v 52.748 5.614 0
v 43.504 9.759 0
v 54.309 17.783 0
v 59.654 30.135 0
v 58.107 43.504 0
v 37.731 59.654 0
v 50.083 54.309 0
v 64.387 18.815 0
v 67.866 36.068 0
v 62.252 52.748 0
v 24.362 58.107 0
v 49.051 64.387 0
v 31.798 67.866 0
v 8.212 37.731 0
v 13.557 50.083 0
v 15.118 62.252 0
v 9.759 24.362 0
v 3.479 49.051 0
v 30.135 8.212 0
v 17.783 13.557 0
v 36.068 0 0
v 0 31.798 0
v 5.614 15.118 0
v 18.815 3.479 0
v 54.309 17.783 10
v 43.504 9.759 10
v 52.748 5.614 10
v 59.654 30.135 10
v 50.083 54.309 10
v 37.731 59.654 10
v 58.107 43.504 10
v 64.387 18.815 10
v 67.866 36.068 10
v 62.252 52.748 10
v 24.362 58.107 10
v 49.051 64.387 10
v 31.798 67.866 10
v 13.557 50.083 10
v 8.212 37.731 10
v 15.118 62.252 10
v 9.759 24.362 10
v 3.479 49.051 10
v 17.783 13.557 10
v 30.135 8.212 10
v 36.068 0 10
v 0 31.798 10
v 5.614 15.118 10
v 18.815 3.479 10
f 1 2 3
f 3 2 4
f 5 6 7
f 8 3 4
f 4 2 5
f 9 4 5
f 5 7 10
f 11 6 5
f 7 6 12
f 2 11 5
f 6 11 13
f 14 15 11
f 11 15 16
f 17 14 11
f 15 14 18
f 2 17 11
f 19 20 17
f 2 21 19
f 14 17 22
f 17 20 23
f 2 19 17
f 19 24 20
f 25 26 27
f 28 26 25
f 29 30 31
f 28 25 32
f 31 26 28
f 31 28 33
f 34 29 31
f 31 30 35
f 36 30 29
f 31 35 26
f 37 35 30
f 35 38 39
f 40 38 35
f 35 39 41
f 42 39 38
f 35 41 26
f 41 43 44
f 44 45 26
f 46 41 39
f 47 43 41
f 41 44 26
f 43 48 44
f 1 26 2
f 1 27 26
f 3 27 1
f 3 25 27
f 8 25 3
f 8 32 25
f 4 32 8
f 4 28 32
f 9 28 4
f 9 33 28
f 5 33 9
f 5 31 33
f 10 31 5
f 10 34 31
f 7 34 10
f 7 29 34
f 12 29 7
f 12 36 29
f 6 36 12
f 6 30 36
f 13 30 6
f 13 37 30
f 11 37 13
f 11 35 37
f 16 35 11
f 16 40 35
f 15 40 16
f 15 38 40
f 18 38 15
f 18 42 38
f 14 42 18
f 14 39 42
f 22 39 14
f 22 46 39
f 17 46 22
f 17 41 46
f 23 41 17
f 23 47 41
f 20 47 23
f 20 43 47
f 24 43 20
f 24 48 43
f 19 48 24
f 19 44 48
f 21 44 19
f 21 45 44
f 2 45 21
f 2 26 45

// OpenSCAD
$fn = 32;

// ----------------------------------------------------------------------
// Chain sprocket: 12 teeth, 26 mm root radius
// ----------------------------------------------------------------------

// --- parameters (mm) ---
profile_height = 10;      // extrusion height
profile_points = 24;      // points of the closed outline

profile = [[59.654, 30.135], [67.866, 36.068], [58.107, 43.504], [62.252, 52.748], [50.083, 54.309], [49.051, 64.387], [37.731, 59.654], [31.798, 67.866], [24.362, 58.107], [15.118, 62.252], [13.557, 50.083], [3.479, 49.051], [8.212, 37.731], [0, 31.798], [9.759, 24.362], [5.614, 15.118], [17.783, 13.557], [18.815, 3.479], [30.135, 8.212], [36.068, 0], [43.504, 9.759], [52.748, 5.614], [54.309, 17.783], [64.387, 18.815]];  // single closed polygon, 24 points, counter clockwise

// --- the one profile operation ---
linear_extrude(height = profile_height) polygon(points = profile);
